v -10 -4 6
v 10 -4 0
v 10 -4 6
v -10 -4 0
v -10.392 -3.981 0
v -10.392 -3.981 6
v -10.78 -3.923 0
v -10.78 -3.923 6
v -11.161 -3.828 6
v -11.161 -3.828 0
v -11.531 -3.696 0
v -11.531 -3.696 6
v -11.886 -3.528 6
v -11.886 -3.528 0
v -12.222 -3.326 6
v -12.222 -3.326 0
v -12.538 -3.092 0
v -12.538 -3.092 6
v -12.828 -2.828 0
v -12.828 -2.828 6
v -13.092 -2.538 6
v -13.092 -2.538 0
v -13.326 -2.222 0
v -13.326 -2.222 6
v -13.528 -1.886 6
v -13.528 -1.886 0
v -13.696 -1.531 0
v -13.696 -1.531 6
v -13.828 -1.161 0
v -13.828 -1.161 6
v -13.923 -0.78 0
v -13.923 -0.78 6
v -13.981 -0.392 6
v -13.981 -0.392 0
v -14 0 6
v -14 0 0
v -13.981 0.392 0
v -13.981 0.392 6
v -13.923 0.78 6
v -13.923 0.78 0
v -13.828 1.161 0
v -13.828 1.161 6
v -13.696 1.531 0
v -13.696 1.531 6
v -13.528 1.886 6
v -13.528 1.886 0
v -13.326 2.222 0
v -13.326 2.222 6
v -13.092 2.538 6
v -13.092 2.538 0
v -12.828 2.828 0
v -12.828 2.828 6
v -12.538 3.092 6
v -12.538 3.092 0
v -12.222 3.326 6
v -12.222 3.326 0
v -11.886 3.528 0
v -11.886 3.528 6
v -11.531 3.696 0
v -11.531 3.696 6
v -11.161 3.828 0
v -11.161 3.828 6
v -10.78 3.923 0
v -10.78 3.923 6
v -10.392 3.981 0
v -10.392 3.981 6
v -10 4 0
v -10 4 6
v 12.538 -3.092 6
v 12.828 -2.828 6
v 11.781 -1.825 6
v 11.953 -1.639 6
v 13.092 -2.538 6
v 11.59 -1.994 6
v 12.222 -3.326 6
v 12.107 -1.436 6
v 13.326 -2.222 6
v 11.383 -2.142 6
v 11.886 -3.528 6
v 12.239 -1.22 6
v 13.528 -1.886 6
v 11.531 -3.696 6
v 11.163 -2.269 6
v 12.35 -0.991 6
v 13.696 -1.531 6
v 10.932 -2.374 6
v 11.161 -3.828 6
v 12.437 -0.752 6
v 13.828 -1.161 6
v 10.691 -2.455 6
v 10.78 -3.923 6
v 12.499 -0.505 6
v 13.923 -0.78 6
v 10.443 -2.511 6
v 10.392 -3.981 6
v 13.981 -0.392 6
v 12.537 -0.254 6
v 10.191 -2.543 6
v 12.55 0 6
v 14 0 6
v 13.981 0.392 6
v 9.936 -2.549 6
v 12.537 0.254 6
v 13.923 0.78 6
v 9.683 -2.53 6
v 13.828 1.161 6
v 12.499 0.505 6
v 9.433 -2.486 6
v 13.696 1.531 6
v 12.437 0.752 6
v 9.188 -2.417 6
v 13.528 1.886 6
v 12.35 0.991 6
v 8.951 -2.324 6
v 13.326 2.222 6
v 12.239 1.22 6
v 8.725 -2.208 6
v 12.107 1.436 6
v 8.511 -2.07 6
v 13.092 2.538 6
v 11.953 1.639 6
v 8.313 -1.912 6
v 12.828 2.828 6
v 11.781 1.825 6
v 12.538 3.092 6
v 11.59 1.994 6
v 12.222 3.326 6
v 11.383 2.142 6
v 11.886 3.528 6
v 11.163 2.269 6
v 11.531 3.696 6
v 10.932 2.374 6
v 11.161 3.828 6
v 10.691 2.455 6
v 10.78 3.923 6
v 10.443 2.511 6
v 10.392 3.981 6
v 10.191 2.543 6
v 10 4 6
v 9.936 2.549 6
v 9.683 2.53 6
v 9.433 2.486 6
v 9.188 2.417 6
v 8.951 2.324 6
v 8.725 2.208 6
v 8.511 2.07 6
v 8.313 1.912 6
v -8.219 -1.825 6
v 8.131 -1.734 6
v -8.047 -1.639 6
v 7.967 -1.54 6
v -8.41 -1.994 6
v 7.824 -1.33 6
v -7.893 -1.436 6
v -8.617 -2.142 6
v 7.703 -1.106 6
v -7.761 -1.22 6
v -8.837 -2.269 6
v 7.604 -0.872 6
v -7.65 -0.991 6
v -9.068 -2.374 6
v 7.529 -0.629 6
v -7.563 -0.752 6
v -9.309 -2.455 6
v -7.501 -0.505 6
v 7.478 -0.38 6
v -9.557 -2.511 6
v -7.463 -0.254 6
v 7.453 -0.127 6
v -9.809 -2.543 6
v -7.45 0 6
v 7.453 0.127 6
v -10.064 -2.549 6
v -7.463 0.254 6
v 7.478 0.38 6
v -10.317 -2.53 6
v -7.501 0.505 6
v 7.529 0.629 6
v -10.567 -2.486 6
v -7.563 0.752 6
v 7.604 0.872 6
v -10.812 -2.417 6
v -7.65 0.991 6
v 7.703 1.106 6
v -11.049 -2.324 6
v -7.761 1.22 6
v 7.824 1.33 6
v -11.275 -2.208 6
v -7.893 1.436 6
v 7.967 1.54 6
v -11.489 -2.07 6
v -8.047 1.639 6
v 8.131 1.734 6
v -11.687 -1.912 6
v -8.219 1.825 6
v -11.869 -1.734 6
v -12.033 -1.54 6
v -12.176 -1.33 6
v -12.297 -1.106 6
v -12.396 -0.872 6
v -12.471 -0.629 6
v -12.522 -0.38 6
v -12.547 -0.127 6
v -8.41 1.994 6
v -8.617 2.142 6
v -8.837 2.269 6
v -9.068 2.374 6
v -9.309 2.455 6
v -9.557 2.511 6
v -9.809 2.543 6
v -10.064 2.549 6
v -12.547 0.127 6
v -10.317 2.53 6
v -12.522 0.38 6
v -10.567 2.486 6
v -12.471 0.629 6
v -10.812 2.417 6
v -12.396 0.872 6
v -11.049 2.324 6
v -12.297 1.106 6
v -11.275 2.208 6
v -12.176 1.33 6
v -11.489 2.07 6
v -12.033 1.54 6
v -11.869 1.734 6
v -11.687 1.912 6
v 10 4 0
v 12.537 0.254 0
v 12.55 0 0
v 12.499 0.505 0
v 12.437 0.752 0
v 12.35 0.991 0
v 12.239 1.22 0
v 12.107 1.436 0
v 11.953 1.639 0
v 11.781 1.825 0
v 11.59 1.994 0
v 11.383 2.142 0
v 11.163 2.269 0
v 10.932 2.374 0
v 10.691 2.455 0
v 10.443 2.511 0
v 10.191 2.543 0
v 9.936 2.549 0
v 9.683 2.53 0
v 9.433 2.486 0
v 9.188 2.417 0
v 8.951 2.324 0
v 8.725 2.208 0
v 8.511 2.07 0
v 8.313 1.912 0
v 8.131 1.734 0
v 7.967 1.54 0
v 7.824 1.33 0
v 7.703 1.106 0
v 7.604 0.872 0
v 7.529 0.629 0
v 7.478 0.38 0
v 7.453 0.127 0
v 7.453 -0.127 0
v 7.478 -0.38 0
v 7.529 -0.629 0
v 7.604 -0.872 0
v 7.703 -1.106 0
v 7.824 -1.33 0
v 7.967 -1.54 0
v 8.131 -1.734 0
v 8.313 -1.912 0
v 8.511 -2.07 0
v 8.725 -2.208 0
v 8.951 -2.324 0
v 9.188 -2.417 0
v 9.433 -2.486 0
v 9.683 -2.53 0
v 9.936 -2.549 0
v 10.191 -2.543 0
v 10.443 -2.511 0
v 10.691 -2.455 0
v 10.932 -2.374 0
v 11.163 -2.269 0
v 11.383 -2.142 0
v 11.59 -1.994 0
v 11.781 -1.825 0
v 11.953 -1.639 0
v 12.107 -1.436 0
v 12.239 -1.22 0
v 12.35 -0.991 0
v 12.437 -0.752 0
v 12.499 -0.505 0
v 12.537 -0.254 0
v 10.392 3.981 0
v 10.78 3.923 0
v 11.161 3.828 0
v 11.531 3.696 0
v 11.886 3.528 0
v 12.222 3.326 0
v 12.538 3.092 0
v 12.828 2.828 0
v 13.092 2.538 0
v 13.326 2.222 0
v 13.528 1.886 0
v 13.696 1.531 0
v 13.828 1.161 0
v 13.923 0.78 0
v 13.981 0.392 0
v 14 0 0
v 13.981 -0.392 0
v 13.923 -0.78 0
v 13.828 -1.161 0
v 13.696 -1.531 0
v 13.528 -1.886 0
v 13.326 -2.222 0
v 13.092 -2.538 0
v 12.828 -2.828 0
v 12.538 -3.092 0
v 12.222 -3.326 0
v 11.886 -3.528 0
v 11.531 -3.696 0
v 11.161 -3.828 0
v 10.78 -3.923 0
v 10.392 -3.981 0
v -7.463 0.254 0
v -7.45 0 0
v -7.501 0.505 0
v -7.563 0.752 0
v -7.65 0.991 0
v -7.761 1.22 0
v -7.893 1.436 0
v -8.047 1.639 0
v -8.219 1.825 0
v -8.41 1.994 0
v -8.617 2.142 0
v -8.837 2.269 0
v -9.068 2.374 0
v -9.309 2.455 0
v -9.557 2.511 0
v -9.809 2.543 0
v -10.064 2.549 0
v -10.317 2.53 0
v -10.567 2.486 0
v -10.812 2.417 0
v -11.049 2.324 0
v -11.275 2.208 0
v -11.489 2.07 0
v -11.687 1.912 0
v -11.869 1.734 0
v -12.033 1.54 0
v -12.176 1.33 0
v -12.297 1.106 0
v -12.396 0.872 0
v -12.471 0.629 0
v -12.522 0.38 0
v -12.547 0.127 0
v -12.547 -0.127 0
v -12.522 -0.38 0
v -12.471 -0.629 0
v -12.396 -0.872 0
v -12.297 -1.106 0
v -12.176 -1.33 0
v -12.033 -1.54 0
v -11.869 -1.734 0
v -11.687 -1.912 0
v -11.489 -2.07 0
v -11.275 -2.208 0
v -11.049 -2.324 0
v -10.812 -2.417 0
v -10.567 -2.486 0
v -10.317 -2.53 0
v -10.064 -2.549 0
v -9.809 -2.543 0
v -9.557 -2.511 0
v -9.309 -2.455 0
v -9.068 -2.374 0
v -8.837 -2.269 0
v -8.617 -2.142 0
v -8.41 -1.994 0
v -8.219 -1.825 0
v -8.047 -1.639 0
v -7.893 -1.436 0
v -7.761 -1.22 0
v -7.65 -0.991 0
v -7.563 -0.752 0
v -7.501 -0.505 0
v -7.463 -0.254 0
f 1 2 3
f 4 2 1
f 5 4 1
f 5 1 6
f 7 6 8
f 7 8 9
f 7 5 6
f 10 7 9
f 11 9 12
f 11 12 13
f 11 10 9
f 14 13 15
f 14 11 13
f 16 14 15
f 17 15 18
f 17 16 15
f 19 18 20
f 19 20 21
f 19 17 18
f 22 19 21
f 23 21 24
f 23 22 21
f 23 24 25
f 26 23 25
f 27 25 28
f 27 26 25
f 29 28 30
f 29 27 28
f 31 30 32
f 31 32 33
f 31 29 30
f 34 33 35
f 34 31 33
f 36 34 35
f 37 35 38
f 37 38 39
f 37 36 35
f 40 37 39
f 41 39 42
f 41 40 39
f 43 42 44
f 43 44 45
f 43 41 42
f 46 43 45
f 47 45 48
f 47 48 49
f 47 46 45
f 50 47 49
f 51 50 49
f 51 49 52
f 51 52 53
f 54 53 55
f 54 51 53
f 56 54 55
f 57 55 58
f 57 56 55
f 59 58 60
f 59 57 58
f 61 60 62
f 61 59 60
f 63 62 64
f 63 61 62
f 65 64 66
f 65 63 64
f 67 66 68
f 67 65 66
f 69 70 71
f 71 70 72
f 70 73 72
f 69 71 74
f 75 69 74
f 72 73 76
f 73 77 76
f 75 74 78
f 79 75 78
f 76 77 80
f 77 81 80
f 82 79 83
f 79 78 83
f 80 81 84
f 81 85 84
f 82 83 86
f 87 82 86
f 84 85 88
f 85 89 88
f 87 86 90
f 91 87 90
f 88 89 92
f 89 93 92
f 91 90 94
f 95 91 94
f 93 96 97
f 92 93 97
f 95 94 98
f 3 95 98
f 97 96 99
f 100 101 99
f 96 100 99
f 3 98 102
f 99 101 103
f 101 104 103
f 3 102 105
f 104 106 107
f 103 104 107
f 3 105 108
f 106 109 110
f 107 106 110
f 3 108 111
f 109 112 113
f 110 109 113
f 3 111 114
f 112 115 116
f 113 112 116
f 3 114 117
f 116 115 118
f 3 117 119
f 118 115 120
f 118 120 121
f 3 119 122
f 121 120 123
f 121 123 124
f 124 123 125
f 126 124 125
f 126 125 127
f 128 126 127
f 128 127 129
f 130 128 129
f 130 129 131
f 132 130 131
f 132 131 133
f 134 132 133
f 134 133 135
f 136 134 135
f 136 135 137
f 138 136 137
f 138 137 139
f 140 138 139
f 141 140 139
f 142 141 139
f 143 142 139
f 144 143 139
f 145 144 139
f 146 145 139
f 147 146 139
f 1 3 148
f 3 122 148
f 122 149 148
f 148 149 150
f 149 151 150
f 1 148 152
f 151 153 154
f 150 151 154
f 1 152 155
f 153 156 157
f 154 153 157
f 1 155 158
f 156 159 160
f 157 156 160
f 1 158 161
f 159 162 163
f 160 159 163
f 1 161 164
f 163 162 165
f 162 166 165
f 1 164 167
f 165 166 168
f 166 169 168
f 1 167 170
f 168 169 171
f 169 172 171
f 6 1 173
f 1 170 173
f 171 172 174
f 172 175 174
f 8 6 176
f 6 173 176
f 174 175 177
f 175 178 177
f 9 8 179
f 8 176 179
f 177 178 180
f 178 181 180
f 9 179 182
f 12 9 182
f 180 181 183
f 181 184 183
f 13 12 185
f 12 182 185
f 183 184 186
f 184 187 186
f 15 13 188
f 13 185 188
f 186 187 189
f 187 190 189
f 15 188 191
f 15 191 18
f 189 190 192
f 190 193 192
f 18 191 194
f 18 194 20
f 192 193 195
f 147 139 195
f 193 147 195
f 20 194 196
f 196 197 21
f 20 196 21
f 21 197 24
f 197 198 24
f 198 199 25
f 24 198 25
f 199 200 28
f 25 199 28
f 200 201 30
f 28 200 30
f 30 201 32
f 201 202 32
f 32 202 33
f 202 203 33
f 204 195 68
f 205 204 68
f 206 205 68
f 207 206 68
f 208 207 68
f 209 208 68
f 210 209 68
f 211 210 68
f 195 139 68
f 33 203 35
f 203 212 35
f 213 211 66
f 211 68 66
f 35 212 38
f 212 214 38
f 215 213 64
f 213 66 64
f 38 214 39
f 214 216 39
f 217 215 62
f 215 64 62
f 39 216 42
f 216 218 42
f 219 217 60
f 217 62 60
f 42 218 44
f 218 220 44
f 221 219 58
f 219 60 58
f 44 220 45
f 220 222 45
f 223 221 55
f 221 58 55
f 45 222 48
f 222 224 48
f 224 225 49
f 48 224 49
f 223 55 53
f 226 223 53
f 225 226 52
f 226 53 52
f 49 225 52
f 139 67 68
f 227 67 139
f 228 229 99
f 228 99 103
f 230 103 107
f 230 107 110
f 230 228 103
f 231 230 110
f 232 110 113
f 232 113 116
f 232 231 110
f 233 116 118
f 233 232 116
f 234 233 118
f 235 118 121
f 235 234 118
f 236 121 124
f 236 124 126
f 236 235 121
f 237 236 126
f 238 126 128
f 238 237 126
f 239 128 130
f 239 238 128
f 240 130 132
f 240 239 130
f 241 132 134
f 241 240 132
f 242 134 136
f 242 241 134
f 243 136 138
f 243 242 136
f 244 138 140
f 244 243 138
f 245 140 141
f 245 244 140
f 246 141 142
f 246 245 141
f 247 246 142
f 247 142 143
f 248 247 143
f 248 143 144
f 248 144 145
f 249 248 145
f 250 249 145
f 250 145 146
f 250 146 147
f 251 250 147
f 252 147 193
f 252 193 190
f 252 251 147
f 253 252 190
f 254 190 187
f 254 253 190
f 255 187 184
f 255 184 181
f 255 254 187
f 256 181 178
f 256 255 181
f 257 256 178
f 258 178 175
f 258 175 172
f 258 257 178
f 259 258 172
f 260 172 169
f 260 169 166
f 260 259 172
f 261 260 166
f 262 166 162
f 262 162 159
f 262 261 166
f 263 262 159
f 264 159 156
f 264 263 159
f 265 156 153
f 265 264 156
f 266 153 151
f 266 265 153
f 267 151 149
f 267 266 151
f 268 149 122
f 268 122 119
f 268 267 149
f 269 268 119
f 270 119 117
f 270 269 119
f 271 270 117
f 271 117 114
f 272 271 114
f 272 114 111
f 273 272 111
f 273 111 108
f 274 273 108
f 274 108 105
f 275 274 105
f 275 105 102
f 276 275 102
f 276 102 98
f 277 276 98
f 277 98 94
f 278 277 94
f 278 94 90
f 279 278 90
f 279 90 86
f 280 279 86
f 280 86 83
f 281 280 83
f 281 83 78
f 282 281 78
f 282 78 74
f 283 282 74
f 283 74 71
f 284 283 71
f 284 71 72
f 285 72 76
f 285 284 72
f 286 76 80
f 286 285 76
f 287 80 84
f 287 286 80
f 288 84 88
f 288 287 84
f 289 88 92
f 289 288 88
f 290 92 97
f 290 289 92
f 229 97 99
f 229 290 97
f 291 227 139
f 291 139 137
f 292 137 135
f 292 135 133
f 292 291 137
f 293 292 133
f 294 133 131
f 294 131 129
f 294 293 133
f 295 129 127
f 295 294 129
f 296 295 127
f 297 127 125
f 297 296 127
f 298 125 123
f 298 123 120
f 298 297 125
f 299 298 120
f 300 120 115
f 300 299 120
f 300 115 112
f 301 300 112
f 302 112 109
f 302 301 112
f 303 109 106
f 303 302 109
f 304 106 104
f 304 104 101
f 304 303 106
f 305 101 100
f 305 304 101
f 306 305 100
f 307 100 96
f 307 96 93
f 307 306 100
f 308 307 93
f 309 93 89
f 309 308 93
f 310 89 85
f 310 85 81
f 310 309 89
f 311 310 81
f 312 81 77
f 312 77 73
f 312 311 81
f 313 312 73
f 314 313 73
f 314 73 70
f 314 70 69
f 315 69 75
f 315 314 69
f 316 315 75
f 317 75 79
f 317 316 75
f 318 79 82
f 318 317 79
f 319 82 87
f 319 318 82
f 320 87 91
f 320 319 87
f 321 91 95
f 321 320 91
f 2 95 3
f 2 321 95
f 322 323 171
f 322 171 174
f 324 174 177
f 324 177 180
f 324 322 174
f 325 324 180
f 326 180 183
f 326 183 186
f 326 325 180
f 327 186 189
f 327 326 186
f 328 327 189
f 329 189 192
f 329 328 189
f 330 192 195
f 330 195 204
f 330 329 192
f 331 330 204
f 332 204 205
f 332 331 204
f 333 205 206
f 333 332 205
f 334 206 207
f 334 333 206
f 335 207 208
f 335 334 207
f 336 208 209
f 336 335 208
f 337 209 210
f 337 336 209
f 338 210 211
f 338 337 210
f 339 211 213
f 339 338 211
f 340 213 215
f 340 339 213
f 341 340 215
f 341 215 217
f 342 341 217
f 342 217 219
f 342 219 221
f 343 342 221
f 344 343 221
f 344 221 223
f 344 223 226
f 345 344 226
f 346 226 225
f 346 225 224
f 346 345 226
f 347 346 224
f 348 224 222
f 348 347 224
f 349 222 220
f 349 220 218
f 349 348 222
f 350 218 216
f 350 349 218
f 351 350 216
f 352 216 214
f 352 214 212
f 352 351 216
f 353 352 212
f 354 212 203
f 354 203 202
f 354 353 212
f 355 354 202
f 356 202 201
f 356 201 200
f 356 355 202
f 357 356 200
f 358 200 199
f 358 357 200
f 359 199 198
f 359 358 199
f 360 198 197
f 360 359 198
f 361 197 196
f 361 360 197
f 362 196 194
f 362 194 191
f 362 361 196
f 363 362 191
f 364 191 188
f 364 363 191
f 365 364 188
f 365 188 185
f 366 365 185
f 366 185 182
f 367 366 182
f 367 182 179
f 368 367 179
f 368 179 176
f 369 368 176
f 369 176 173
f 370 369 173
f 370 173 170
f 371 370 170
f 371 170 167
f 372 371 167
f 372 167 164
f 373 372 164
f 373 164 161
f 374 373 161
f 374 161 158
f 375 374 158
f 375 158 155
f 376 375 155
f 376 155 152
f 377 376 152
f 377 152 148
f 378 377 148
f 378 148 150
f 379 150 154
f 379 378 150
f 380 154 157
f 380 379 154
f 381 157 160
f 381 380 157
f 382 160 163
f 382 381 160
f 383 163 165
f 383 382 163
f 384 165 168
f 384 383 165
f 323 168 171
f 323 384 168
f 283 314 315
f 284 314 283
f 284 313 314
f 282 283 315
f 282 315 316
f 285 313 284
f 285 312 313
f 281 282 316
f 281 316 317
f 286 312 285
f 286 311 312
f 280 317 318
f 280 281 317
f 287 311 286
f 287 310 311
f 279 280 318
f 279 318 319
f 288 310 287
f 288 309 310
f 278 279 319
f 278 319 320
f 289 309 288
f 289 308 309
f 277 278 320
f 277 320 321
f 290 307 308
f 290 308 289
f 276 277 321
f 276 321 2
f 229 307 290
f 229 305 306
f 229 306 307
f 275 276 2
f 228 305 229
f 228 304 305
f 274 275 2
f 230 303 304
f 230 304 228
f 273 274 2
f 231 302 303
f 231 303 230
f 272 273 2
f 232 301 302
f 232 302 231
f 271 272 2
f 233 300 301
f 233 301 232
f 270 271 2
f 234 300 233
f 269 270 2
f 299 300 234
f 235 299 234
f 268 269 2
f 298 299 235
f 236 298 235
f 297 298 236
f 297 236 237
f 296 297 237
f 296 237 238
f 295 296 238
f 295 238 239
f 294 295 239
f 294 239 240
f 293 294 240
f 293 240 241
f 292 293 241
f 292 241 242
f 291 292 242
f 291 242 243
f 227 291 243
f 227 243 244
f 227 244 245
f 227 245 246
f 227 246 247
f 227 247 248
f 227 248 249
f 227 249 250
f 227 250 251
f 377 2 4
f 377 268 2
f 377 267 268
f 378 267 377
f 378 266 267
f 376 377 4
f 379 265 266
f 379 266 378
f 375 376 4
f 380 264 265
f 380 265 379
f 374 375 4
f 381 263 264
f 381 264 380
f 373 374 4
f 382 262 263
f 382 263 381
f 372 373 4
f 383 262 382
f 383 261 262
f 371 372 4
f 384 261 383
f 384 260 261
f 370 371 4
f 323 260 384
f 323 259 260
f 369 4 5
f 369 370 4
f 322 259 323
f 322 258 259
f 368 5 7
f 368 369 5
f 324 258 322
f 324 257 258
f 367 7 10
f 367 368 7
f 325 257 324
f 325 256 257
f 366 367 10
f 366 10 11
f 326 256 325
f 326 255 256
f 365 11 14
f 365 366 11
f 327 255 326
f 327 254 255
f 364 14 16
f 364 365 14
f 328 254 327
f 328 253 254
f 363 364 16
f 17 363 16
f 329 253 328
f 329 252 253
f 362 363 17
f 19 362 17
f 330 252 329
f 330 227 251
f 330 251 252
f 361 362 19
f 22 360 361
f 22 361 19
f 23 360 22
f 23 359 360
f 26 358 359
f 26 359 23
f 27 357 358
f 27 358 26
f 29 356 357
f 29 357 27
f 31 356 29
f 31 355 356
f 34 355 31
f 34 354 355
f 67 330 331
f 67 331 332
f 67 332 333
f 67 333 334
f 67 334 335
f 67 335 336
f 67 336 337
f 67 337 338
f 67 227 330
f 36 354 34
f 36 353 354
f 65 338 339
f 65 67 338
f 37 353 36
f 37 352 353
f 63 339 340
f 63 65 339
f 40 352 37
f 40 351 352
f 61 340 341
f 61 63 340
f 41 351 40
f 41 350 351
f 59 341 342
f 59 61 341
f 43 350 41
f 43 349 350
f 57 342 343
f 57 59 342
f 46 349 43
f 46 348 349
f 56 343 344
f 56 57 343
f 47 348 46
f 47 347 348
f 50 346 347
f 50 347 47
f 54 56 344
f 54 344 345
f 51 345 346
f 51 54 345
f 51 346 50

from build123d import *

# Parameters (mm, degrees)
SKETCH_1_R      = 2.55
EXTRUDE_1_DEPTH = 6


with BuildPart() as part:
    # Эскиз1 → Бобышка-Вытянуть1 (new body)
    with BuildSketch(Plane.XY):
        with BuildLine():
            Line((10, -4), (5, -4))
            Line((5, -4), (-10, -4))
            ThreePointArc((-10, -4), (-14, 0), (-10, 4))
            Line((-10, 4), (10, 4))
            ThreePointArc((10, 4), (14, 0), (10, -4))
        make_face()
        with Locations((10, 0)):
            Circle(SKETCH_1_R, mode=Mode.SUBTRACT)
        with Locations((-10, 0)):
            Circle(SKETCH_1_R, mode=Mode.SUBTRACT)
    extrude(amount=EXTRUDE_1_DEPTH)


solid = part.part
